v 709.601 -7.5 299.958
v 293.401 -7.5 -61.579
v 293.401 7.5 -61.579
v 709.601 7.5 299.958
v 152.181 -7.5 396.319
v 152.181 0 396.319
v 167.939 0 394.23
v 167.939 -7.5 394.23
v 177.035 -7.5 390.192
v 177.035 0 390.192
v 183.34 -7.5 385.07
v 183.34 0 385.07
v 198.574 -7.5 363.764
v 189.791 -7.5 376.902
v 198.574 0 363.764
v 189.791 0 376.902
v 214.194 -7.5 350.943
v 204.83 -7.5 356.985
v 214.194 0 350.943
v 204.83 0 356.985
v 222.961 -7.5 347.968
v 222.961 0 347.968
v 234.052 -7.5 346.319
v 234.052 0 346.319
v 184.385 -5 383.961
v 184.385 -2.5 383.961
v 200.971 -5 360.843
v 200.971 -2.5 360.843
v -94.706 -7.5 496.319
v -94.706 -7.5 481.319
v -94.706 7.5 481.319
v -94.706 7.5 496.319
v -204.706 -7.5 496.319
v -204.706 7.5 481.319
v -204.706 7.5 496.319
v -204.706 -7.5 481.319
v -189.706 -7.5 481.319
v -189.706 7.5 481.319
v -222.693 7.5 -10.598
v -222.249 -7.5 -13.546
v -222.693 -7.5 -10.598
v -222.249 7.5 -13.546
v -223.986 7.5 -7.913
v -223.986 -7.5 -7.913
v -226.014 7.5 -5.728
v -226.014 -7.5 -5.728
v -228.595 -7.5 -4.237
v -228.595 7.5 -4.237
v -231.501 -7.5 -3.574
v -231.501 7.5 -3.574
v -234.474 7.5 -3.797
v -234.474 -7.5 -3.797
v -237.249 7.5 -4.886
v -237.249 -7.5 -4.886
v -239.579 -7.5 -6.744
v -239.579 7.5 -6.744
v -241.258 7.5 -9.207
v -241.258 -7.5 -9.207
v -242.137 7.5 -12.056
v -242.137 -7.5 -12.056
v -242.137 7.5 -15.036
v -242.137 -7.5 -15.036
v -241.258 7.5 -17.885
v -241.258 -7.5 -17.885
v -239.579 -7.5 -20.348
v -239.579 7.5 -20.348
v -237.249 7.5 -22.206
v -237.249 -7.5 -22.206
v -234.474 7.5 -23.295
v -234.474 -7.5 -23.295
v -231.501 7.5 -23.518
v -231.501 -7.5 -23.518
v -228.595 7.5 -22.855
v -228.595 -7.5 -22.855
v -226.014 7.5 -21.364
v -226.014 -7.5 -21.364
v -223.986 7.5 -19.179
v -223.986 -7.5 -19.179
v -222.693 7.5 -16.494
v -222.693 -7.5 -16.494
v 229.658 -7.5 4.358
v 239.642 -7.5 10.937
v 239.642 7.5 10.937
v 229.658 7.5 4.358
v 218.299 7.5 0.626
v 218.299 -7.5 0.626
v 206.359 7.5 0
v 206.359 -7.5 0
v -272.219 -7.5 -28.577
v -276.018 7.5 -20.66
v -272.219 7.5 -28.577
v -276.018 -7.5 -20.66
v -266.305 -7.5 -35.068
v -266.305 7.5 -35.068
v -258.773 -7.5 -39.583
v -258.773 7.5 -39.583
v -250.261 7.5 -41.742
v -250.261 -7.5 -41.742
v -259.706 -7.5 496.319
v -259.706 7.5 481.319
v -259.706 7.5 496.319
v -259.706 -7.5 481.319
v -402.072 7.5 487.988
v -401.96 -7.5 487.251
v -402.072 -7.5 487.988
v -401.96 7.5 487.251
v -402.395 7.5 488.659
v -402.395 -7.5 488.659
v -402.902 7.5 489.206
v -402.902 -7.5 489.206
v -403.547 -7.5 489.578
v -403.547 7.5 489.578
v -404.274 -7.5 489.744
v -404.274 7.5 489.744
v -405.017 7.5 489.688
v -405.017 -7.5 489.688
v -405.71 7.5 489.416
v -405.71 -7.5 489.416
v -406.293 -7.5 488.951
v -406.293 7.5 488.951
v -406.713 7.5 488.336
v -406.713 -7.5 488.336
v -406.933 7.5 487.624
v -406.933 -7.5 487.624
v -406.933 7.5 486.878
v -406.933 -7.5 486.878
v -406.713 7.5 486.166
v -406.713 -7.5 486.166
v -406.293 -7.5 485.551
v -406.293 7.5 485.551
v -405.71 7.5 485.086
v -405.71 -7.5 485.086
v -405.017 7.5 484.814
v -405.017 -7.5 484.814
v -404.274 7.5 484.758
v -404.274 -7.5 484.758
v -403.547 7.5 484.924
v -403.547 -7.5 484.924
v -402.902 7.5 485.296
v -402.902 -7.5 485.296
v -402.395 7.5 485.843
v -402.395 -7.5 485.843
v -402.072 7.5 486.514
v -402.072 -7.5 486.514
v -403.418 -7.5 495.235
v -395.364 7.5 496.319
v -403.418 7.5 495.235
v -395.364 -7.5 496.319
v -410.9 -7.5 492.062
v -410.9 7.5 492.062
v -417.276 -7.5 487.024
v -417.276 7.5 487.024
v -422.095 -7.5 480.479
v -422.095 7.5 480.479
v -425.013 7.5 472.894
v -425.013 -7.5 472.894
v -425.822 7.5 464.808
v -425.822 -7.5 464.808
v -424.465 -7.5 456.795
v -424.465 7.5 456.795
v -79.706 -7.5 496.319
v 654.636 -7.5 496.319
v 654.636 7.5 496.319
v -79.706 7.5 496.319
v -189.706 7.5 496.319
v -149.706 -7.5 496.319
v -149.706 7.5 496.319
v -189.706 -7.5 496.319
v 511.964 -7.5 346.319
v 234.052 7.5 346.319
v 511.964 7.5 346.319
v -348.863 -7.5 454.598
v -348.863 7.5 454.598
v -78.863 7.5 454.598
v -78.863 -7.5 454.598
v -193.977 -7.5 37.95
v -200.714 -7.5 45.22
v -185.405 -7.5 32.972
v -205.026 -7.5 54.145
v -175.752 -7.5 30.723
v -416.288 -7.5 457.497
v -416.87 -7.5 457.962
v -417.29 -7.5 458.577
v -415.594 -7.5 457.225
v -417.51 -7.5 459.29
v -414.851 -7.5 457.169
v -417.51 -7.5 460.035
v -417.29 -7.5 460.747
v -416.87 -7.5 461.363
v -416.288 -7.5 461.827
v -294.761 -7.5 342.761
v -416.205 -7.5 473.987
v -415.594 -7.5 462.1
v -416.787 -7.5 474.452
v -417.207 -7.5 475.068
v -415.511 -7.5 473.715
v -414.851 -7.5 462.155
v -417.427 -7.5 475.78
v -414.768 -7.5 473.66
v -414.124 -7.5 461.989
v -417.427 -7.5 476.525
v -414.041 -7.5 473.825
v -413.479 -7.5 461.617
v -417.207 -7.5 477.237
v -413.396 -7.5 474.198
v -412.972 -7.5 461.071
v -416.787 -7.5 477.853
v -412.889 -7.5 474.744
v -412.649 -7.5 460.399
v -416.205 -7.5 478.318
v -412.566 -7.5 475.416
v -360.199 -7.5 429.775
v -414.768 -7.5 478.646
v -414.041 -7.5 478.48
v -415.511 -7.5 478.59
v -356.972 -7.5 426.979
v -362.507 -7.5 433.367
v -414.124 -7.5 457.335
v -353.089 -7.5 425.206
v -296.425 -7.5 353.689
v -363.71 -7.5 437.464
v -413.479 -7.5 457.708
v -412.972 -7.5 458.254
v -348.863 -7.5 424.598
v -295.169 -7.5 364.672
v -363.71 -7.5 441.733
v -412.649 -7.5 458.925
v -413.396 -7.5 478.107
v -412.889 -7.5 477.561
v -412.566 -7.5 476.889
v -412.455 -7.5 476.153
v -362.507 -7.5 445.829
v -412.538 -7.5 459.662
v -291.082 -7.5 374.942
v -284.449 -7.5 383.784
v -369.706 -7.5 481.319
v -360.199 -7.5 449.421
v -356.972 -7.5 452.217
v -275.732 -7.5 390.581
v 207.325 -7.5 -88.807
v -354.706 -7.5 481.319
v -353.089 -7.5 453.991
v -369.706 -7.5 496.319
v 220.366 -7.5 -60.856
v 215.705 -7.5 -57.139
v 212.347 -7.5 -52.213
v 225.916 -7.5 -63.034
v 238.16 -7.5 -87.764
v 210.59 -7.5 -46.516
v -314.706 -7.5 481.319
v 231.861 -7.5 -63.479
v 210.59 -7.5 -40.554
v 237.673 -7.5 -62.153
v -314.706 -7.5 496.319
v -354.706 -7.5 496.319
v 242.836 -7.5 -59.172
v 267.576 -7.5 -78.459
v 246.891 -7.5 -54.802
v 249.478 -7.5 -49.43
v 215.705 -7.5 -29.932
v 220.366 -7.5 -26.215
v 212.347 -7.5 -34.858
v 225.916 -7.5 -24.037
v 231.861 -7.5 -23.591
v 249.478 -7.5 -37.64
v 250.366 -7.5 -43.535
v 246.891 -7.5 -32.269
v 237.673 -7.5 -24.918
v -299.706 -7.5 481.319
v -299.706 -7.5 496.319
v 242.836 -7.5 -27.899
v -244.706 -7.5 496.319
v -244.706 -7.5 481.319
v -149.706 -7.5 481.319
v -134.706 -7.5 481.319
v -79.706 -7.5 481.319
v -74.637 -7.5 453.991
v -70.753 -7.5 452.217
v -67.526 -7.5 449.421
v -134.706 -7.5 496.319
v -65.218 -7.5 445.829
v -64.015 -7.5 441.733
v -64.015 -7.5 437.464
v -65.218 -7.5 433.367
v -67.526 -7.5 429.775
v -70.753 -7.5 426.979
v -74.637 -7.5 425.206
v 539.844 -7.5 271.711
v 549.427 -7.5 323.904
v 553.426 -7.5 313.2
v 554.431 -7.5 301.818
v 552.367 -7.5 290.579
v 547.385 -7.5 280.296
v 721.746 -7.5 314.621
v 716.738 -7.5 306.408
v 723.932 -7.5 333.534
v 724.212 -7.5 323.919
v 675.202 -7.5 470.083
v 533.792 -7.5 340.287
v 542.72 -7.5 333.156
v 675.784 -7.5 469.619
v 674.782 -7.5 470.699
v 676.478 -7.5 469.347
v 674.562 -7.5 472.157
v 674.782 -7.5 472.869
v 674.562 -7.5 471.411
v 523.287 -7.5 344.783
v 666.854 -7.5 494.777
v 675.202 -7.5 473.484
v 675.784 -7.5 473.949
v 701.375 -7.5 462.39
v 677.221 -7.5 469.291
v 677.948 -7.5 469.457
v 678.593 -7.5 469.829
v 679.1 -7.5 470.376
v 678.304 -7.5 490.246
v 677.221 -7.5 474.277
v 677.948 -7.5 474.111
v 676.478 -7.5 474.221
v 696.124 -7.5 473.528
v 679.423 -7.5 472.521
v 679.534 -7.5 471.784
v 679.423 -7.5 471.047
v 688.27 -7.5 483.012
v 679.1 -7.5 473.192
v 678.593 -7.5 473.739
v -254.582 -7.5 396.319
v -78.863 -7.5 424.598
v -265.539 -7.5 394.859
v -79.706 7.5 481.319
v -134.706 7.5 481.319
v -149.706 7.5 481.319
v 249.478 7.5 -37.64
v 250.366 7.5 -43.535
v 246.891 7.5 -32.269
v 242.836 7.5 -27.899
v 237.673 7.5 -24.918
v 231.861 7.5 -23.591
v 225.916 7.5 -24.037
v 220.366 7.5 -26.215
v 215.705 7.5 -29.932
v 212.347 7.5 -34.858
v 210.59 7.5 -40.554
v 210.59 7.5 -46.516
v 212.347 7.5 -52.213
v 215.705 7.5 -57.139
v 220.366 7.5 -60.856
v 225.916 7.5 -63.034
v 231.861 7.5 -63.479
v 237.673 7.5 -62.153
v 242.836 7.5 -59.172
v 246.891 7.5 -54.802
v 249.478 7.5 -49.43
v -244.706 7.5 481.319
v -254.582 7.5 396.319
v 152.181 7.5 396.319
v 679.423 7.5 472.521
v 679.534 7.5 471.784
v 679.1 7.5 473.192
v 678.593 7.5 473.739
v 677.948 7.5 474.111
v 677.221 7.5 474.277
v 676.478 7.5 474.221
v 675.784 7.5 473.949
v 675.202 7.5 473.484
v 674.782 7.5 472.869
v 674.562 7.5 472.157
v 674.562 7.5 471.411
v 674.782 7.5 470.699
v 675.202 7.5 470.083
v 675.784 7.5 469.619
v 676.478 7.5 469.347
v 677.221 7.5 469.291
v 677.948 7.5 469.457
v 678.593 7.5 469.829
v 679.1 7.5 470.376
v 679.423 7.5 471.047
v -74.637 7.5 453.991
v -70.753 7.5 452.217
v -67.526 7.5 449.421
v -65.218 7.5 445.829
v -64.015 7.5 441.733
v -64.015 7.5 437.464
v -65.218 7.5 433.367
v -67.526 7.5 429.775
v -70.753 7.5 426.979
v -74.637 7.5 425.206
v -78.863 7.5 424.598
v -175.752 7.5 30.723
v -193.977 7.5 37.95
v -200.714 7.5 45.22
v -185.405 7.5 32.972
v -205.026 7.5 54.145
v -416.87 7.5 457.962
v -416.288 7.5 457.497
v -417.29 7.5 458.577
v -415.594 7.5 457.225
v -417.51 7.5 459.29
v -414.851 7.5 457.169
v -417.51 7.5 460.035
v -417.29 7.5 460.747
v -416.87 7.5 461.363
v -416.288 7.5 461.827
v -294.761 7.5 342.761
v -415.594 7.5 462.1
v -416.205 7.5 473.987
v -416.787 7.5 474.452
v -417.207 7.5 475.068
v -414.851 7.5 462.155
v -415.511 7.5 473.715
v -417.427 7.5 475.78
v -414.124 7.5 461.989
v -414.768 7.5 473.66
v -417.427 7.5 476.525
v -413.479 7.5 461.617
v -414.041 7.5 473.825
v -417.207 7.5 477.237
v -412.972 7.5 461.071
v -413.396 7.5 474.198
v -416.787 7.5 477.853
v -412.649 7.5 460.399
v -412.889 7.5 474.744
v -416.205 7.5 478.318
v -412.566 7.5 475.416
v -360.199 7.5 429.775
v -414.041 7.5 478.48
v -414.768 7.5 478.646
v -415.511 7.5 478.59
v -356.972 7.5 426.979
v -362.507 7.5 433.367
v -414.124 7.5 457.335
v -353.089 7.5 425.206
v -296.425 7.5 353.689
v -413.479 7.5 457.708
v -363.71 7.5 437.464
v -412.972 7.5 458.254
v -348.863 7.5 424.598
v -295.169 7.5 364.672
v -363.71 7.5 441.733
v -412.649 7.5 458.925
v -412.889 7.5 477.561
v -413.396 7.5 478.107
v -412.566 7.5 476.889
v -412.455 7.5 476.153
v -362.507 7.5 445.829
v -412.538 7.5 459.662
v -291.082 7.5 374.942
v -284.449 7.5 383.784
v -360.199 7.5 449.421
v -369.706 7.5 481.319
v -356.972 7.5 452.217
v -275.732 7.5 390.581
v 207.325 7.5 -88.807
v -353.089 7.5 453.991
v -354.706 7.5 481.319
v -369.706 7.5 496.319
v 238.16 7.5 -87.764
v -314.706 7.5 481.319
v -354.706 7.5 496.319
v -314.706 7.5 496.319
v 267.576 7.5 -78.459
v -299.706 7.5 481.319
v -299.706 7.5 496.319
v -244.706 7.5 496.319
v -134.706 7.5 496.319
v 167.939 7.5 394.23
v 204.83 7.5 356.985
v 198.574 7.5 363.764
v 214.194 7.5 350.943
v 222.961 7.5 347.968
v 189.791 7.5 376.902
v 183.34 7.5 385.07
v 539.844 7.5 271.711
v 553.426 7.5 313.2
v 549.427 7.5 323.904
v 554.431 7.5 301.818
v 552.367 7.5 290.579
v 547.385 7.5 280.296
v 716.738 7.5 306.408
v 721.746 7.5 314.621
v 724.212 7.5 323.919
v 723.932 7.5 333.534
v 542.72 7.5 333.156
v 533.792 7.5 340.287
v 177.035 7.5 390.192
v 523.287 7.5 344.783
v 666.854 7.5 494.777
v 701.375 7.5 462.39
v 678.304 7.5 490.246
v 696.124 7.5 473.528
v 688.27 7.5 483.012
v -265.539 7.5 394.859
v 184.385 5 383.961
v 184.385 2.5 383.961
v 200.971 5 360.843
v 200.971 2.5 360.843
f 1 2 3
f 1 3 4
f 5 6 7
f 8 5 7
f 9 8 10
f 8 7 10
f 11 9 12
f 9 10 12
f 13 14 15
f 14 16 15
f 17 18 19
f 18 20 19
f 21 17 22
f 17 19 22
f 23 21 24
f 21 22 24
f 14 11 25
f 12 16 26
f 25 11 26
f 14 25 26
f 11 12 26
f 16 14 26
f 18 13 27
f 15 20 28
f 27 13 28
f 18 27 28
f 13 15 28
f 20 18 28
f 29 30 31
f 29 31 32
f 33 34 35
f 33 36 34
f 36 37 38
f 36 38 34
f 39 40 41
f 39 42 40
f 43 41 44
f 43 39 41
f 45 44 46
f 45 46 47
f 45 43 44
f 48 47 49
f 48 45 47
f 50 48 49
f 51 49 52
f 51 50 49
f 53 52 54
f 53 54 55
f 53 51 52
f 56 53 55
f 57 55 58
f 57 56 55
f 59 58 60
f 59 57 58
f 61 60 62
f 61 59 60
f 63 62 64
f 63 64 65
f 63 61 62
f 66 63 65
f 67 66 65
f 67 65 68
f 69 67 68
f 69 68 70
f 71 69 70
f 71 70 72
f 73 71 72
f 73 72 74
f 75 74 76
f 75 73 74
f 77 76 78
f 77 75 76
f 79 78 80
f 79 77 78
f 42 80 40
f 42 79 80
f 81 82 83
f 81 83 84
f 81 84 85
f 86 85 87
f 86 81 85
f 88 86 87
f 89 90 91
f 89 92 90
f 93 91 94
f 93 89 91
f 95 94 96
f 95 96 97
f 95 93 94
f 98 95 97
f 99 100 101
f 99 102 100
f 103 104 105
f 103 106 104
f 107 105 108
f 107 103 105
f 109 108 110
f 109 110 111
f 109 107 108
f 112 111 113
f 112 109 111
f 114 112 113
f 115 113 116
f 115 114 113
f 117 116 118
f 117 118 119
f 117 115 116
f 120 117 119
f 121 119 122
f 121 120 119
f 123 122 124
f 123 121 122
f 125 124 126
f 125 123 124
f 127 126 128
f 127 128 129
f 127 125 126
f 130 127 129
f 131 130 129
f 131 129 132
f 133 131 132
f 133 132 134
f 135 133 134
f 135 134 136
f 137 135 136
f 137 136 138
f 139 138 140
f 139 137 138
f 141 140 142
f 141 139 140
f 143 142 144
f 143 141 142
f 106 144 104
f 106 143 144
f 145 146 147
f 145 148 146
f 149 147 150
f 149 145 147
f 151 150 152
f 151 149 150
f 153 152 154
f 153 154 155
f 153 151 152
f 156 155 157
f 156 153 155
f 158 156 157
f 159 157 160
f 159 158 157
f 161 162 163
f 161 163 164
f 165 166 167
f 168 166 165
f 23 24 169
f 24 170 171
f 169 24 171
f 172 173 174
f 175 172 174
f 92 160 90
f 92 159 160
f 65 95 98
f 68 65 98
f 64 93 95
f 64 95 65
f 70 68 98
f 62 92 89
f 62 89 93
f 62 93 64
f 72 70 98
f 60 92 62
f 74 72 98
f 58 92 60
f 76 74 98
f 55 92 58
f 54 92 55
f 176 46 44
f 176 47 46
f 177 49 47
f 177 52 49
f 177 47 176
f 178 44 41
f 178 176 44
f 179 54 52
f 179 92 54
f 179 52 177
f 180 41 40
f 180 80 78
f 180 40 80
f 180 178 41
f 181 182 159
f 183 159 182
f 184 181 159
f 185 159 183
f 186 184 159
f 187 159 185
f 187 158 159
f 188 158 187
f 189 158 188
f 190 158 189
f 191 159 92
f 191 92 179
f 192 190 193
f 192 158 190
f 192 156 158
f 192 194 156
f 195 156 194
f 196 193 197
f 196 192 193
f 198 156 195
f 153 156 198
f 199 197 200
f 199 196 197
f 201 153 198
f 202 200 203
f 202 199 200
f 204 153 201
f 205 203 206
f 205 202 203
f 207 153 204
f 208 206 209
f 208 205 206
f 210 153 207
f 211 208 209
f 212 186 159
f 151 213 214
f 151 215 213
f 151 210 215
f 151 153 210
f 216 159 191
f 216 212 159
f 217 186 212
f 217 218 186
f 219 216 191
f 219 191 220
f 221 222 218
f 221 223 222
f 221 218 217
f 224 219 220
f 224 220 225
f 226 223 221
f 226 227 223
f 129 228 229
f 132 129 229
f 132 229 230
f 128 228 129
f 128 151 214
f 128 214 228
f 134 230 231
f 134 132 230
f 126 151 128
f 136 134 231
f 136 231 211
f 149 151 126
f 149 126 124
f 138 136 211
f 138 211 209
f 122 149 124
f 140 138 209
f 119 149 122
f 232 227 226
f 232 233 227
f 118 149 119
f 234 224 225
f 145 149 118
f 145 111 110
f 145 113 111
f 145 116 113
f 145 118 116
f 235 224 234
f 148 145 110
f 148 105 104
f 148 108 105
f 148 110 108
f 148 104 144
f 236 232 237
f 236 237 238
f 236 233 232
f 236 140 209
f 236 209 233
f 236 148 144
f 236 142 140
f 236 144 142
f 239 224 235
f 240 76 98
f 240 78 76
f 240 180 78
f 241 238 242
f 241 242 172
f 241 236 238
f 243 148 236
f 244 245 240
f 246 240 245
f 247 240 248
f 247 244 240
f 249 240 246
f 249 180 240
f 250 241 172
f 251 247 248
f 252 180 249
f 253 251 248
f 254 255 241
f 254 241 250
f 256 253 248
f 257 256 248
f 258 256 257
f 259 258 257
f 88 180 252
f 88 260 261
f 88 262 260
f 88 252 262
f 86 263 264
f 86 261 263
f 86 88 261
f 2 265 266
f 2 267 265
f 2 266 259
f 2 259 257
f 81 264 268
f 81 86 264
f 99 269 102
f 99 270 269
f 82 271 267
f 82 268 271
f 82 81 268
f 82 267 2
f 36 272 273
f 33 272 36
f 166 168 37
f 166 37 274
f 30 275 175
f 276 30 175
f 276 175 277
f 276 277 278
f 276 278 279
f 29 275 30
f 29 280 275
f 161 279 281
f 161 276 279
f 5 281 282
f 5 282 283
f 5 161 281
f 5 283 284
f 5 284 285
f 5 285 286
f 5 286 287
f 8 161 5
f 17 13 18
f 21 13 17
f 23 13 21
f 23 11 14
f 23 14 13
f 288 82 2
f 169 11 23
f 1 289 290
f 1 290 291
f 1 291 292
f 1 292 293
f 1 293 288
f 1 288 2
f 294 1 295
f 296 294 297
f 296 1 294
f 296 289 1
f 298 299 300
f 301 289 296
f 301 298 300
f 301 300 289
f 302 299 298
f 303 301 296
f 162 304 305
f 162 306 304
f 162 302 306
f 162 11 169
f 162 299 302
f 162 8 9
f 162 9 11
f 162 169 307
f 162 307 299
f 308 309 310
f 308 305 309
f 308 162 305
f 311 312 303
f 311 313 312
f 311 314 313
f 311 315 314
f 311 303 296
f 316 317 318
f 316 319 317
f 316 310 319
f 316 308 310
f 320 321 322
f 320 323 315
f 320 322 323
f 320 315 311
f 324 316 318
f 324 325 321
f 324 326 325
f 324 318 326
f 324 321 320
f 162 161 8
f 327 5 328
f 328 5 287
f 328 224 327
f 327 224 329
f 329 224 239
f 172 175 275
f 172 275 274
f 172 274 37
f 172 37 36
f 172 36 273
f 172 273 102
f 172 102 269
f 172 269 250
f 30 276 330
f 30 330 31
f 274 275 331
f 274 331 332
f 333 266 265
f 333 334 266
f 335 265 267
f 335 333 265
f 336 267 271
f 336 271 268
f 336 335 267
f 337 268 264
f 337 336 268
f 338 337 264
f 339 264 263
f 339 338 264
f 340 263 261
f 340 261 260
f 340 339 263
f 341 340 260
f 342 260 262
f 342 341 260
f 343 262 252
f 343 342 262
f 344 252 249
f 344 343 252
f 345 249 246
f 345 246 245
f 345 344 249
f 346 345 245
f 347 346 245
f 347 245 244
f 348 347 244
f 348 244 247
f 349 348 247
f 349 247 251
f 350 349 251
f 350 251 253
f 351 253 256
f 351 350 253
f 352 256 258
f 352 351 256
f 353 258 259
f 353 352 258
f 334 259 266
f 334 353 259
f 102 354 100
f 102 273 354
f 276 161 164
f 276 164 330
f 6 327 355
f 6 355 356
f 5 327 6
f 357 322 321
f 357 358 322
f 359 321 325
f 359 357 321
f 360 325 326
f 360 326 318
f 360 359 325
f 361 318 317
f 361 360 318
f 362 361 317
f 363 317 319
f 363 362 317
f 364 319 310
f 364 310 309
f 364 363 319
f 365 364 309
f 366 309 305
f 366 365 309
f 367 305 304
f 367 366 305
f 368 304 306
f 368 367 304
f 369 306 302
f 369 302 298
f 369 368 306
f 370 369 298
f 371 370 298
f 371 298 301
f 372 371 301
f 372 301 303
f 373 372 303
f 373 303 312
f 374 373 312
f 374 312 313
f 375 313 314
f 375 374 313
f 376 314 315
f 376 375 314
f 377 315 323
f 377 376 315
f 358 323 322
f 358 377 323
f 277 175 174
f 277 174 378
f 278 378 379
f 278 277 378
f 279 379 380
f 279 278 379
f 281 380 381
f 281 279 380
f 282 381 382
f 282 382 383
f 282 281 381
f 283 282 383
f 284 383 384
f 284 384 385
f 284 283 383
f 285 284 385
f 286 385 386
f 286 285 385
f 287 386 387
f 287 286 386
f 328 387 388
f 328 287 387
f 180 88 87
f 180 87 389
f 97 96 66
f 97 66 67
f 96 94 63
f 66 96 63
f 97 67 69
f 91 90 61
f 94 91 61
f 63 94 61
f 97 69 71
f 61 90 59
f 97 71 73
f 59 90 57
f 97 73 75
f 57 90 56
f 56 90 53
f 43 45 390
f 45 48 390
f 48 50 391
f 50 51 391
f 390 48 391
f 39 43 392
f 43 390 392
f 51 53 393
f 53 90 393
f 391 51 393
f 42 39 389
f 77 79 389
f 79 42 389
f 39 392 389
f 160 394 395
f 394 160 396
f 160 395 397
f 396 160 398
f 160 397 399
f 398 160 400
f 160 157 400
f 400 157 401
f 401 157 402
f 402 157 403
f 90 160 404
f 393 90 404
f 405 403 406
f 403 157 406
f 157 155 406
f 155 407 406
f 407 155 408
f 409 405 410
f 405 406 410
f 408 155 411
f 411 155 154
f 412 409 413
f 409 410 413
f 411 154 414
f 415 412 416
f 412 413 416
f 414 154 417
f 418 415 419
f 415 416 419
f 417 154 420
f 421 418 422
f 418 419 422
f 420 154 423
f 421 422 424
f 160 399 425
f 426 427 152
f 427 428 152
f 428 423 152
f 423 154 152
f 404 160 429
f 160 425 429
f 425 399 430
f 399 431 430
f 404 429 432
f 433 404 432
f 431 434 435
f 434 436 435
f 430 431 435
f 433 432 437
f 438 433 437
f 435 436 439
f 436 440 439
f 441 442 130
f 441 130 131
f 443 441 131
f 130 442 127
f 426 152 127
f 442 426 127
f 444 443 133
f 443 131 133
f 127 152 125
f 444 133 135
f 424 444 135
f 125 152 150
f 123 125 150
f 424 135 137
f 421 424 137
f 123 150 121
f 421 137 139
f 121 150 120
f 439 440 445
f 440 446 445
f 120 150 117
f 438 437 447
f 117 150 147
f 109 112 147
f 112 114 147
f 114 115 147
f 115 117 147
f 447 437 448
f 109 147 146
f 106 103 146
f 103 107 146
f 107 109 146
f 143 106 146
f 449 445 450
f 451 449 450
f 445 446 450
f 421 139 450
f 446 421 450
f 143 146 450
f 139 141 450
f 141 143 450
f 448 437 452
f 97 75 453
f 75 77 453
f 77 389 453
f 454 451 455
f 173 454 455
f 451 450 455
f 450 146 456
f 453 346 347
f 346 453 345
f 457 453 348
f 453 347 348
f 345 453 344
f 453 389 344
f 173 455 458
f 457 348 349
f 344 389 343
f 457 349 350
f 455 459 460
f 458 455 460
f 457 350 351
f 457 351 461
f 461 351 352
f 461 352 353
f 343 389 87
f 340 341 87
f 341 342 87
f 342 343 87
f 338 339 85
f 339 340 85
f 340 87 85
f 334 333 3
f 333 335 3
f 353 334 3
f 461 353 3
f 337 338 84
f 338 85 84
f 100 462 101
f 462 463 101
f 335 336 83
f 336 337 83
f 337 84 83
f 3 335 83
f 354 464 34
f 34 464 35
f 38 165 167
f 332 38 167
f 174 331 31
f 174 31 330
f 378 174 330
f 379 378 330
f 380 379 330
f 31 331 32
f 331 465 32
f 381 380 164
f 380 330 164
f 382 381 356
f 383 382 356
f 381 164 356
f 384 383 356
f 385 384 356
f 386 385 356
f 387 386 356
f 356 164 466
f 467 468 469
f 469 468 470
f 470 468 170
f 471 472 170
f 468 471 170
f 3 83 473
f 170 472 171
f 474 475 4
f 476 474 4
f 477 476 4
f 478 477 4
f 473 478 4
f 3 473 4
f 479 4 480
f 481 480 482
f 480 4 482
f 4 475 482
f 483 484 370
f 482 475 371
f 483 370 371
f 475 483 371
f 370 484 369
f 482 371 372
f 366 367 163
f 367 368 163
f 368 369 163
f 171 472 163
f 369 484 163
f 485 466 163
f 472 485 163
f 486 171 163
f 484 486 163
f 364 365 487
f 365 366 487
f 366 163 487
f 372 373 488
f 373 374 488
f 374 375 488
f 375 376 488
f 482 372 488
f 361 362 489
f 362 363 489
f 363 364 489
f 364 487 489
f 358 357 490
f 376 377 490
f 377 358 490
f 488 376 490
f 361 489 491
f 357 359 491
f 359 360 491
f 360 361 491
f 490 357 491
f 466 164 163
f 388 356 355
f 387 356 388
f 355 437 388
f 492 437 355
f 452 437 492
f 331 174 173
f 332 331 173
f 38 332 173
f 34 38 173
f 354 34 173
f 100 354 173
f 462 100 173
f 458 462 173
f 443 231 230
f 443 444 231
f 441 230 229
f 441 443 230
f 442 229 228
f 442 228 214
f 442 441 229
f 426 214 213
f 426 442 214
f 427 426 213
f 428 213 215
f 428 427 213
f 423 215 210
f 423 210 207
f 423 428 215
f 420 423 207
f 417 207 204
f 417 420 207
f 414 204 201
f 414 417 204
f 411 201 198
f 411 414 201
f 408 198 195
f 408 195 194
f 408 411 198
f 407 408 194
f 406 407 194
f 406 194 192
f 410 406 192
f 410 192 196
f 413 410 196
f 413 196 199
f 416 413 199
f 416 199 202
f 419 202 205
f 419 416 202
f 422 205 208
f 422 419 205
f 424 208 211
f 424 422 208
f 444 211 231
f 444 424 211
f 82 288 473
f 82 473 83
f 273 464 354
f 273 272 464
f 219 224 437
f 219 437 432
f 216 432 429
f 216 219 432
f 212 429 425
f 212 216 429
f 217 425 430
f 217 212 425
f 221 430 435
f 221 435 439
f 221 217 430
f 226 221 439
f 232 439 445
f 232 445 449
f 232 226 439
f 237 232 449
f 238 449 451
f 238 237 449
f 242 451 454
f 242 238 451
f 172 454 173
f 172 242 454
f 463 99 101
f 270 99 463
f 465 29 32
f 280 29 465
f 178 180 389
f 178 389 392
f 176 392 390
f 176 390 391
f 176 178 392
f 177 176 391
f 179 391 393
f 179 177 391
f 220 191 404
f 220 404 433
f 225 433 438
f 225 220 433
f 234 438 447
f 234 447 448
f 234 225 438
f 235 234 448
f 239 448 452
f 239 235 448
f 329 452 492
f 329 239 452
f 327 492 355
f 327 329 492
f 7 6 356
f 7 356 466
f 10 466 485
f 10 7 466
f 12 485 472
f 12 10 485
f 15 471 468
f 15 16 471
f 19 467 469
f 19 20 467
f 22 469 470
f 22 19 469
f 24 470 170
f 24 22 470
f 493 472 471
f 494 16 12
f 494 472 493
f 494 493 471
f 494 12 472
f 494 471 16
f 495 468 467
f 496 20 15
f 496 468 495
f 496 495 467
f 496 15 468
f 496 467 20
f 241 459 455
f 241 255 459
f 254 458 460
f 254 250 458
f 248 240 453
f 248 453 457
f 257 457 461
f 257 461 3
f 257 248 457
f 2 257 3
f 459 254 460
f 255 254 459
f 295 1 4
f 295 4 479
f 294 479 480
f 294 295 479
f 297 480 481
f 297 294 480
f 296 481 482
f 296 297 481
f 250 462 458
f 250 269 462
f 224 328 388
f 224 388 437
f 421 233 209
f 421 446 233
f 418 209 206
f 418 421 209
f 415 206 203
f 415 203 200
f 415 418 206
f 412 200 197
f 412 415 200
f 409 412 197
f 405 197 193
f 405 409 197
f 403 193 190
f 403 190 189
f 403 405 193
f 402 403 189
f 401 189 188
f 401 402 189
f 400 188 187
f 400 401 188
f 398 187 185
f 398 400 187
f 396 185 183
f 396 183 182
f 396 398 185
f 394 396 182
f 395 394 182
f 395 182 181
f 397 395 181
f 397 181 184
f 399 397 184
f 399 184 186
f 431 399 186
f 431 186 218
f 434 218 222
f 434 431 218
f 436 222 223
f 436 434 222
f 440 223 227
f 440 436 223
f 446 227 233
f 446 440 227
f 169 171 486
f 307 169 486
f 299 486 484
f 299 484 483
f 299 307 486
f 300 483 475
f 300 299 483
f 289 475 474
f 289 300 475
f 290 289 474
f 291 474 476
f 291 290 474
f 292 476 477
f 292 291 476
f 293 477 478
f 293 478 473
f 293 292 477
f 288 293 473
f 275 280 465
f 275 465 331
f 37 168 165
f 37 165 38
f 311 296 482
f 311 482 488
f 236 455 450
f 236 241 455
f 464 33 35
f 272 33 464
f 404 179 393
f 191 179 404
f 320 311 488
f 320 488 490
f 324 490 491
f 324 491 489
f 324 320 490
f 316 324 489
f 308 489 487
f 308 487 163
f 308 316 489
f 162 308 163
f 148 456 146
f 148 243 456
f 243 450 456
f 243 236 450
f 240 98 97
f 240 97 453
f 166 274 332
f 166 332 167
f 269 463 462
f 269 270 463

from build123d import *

# Parameters (mm, degrees)
F0_R     = 10
F0_R_2   = 20
F0_R_3   = 2.5
F1_DEPTH = 7.5


with BuildPart() as f1:
    # F0 (on Front) → F1 (new body, symmetric)
    with BuildSketch(Plane.XZ):
        with BuildLine():
            ThreePointArc((-276.017555, -20.660086), (-266.304674, -35.067994), (-250.261343, -41.741776))
            Line((-250.261343, -41.741776), (207.324587, -88.806799))
            ThreePointArc((207.324587, -88.806799), (253.185254, -84.115685), (293.400793, -61.578656))
            Line((293.400793, -61.578656), (709.601084, 299.95794))
            ThreePointArc((709.601084, 299.95794), (721.746277, 314.620589), (723.932064, 333.534112))
            Line((723.932064, 333.534112), (701.375468, 462.389844))
            ThreePointArc((701.375468, 462.389844), (683.514294, 486.942452), (654.636412, 496.31902))
            Line((654.636412, 496.31902), (-79.706343, 496.31902))
            Line((-79.706343, 496.31902), (-79.706343, 481.31902))
            Line((-79.706343, 481.31902), (-94.706343, 481.31902))
            Line((-94.706343, 481.31902), (-94.706343, 496.31902))
            Line((-94.706343, 496.31902), (-134.706343, 496.31902))
            Line((-134.706343, 496.31902), (-134.706343, 481.31902))
            Line((-134.706343, 481.31902), (-149.706343, 481.31902))
            Line((-149.706343, 481.31902), (-149.706343, 496.31902))
            Line((-149.706343, 496.31902), (-189.706343, 496.31902))
            Line((-189.706343, 496.31902), (-189.706343, 481.31902))
            Line((-189.706343, 481.31902), (-204.706343, 481.31902))
            Line((-204.706343, 481.31902), (-204.706343, 496.31902))
            Line((-204.706343, 496.31902), (-244.706343, 496.31902))
            Line((-244.706343, 496.31902), (-244.706343, 481.31902))
            Line((-244.706343, 481.31902), (-259.706343, 481.31902))
            Line((-259.706343, 481.31902), (-259.706343, 496.31902))
            Line((-259.706343, 496.31902), (-299.706343, 496.31902))
            Line((-299.706343, 496.31902), (-299.706343, 481.31902))
            Line((-299.706343, 481.31902), (-314.706343, 481.31902))
            Line((-314.706343, 481.31902), (-314.706343, 496.31902))
            Line((-314.706343, 496.31902), (-354.706343, 496.31902))
            Line((-354.706343, 496.31902), (-354.706343, 481.31902))
            Line((-354.706343, 481.31902), (-369.706343, 481.31902))
            Line((-369.706343, 481.31902), (-369.706343, 496.31902))
            Line((-369.706343, 496.31902), (-395.363588, 496.31902))
            ThreePointArc((-395.363588, 496.31902), (-419.90474, 483.912815), (-424.465387, 456.794876))
            Line((-424.465387, 456.794876), (-276.017555, -20.660086))
        make_face()
        with Locations((-232.248772, -13.546013)):
            Circle(F0_R, mode=Mode.SUBTRACT)
        with BuildLine():
            Line((-205.025903, 54.145206), (-294.760891, 342.761177))
            ThreePointArc((-294.760891, 342.761177), (-288.05875, 379.583252), (-254.581922, 396.31902))
            Line((-254.581922, 396.31902), (152.180821, 396.31902))
            add(Edge.make_bspline(
                [(152.180821, 396.31902), (202.900278, 395.792604), (182.017022, 350.09414), (234.05233, 346.31902)],
                knots=[0, 0, 0, 0, 95.931976, 95.931976, 95.931976, 95.931976], degree=3))
            Line((234.05233, 346.31902), (511.96432, 346.31902))
            ThreePointArc((511.96432, 346.31902), (551.787832, 318.687201), (539.843978, 271.71089))
            Line((539.843978, 271.71089), (239.642025, 10.937424))
            ThreePointArc((239.642025, 10.937424), (224.102433, 2.114935), (206.358638, 0))
            Line((206.358638, 0), (-175.751697, 30.723296))
            ThreePointArc((-175.751697, 30.723296), (-193.976565, 37.950032), (-205.025903, 54.145206))
        make_face(mode=Mode.SUBTRACT)
        with Locations((230.366445, -43.535308)):
            Circle(F0_R_2, mode=Mode.SUBTRACT)
        with Locations((-415.037585, 459.662208)):
            Circle(F0_R_3, mode=Mode.SUBTRACT)
        with Locations((-414.954704, 476.152515)):
            Circle(F0_R_3, mode=Mode.SUBTRACT)
        with Locations((-404.460467, 487.250969)):
            Circle(F0_R_3, mode=Mode.SUBTRACT)
        with BuildLine():
            ThreePointArc((-348.862556, 424.598233), (-363.862556, 439.598233), (-348.862556, 454.598233))
            Line((-348.862556, 454.598233), (-78.862556, 454.598233))
            ThreePointArc((-78.862556, 454.598233), (-63.862556, 439.598233), (-78.862556, 424.598233))
            Line((-78.862556, 424.598233), (-348.862556, 424.598233))
        make_face(mode=Mode.SUBTRACT)
        with Locations((677.034383, 471.78393)):
            Circle(F0_R_3, mode=Mode.SUBTRACT)
    extrude(amount=F1_DEPTH, both=True)


solid = f1.part
